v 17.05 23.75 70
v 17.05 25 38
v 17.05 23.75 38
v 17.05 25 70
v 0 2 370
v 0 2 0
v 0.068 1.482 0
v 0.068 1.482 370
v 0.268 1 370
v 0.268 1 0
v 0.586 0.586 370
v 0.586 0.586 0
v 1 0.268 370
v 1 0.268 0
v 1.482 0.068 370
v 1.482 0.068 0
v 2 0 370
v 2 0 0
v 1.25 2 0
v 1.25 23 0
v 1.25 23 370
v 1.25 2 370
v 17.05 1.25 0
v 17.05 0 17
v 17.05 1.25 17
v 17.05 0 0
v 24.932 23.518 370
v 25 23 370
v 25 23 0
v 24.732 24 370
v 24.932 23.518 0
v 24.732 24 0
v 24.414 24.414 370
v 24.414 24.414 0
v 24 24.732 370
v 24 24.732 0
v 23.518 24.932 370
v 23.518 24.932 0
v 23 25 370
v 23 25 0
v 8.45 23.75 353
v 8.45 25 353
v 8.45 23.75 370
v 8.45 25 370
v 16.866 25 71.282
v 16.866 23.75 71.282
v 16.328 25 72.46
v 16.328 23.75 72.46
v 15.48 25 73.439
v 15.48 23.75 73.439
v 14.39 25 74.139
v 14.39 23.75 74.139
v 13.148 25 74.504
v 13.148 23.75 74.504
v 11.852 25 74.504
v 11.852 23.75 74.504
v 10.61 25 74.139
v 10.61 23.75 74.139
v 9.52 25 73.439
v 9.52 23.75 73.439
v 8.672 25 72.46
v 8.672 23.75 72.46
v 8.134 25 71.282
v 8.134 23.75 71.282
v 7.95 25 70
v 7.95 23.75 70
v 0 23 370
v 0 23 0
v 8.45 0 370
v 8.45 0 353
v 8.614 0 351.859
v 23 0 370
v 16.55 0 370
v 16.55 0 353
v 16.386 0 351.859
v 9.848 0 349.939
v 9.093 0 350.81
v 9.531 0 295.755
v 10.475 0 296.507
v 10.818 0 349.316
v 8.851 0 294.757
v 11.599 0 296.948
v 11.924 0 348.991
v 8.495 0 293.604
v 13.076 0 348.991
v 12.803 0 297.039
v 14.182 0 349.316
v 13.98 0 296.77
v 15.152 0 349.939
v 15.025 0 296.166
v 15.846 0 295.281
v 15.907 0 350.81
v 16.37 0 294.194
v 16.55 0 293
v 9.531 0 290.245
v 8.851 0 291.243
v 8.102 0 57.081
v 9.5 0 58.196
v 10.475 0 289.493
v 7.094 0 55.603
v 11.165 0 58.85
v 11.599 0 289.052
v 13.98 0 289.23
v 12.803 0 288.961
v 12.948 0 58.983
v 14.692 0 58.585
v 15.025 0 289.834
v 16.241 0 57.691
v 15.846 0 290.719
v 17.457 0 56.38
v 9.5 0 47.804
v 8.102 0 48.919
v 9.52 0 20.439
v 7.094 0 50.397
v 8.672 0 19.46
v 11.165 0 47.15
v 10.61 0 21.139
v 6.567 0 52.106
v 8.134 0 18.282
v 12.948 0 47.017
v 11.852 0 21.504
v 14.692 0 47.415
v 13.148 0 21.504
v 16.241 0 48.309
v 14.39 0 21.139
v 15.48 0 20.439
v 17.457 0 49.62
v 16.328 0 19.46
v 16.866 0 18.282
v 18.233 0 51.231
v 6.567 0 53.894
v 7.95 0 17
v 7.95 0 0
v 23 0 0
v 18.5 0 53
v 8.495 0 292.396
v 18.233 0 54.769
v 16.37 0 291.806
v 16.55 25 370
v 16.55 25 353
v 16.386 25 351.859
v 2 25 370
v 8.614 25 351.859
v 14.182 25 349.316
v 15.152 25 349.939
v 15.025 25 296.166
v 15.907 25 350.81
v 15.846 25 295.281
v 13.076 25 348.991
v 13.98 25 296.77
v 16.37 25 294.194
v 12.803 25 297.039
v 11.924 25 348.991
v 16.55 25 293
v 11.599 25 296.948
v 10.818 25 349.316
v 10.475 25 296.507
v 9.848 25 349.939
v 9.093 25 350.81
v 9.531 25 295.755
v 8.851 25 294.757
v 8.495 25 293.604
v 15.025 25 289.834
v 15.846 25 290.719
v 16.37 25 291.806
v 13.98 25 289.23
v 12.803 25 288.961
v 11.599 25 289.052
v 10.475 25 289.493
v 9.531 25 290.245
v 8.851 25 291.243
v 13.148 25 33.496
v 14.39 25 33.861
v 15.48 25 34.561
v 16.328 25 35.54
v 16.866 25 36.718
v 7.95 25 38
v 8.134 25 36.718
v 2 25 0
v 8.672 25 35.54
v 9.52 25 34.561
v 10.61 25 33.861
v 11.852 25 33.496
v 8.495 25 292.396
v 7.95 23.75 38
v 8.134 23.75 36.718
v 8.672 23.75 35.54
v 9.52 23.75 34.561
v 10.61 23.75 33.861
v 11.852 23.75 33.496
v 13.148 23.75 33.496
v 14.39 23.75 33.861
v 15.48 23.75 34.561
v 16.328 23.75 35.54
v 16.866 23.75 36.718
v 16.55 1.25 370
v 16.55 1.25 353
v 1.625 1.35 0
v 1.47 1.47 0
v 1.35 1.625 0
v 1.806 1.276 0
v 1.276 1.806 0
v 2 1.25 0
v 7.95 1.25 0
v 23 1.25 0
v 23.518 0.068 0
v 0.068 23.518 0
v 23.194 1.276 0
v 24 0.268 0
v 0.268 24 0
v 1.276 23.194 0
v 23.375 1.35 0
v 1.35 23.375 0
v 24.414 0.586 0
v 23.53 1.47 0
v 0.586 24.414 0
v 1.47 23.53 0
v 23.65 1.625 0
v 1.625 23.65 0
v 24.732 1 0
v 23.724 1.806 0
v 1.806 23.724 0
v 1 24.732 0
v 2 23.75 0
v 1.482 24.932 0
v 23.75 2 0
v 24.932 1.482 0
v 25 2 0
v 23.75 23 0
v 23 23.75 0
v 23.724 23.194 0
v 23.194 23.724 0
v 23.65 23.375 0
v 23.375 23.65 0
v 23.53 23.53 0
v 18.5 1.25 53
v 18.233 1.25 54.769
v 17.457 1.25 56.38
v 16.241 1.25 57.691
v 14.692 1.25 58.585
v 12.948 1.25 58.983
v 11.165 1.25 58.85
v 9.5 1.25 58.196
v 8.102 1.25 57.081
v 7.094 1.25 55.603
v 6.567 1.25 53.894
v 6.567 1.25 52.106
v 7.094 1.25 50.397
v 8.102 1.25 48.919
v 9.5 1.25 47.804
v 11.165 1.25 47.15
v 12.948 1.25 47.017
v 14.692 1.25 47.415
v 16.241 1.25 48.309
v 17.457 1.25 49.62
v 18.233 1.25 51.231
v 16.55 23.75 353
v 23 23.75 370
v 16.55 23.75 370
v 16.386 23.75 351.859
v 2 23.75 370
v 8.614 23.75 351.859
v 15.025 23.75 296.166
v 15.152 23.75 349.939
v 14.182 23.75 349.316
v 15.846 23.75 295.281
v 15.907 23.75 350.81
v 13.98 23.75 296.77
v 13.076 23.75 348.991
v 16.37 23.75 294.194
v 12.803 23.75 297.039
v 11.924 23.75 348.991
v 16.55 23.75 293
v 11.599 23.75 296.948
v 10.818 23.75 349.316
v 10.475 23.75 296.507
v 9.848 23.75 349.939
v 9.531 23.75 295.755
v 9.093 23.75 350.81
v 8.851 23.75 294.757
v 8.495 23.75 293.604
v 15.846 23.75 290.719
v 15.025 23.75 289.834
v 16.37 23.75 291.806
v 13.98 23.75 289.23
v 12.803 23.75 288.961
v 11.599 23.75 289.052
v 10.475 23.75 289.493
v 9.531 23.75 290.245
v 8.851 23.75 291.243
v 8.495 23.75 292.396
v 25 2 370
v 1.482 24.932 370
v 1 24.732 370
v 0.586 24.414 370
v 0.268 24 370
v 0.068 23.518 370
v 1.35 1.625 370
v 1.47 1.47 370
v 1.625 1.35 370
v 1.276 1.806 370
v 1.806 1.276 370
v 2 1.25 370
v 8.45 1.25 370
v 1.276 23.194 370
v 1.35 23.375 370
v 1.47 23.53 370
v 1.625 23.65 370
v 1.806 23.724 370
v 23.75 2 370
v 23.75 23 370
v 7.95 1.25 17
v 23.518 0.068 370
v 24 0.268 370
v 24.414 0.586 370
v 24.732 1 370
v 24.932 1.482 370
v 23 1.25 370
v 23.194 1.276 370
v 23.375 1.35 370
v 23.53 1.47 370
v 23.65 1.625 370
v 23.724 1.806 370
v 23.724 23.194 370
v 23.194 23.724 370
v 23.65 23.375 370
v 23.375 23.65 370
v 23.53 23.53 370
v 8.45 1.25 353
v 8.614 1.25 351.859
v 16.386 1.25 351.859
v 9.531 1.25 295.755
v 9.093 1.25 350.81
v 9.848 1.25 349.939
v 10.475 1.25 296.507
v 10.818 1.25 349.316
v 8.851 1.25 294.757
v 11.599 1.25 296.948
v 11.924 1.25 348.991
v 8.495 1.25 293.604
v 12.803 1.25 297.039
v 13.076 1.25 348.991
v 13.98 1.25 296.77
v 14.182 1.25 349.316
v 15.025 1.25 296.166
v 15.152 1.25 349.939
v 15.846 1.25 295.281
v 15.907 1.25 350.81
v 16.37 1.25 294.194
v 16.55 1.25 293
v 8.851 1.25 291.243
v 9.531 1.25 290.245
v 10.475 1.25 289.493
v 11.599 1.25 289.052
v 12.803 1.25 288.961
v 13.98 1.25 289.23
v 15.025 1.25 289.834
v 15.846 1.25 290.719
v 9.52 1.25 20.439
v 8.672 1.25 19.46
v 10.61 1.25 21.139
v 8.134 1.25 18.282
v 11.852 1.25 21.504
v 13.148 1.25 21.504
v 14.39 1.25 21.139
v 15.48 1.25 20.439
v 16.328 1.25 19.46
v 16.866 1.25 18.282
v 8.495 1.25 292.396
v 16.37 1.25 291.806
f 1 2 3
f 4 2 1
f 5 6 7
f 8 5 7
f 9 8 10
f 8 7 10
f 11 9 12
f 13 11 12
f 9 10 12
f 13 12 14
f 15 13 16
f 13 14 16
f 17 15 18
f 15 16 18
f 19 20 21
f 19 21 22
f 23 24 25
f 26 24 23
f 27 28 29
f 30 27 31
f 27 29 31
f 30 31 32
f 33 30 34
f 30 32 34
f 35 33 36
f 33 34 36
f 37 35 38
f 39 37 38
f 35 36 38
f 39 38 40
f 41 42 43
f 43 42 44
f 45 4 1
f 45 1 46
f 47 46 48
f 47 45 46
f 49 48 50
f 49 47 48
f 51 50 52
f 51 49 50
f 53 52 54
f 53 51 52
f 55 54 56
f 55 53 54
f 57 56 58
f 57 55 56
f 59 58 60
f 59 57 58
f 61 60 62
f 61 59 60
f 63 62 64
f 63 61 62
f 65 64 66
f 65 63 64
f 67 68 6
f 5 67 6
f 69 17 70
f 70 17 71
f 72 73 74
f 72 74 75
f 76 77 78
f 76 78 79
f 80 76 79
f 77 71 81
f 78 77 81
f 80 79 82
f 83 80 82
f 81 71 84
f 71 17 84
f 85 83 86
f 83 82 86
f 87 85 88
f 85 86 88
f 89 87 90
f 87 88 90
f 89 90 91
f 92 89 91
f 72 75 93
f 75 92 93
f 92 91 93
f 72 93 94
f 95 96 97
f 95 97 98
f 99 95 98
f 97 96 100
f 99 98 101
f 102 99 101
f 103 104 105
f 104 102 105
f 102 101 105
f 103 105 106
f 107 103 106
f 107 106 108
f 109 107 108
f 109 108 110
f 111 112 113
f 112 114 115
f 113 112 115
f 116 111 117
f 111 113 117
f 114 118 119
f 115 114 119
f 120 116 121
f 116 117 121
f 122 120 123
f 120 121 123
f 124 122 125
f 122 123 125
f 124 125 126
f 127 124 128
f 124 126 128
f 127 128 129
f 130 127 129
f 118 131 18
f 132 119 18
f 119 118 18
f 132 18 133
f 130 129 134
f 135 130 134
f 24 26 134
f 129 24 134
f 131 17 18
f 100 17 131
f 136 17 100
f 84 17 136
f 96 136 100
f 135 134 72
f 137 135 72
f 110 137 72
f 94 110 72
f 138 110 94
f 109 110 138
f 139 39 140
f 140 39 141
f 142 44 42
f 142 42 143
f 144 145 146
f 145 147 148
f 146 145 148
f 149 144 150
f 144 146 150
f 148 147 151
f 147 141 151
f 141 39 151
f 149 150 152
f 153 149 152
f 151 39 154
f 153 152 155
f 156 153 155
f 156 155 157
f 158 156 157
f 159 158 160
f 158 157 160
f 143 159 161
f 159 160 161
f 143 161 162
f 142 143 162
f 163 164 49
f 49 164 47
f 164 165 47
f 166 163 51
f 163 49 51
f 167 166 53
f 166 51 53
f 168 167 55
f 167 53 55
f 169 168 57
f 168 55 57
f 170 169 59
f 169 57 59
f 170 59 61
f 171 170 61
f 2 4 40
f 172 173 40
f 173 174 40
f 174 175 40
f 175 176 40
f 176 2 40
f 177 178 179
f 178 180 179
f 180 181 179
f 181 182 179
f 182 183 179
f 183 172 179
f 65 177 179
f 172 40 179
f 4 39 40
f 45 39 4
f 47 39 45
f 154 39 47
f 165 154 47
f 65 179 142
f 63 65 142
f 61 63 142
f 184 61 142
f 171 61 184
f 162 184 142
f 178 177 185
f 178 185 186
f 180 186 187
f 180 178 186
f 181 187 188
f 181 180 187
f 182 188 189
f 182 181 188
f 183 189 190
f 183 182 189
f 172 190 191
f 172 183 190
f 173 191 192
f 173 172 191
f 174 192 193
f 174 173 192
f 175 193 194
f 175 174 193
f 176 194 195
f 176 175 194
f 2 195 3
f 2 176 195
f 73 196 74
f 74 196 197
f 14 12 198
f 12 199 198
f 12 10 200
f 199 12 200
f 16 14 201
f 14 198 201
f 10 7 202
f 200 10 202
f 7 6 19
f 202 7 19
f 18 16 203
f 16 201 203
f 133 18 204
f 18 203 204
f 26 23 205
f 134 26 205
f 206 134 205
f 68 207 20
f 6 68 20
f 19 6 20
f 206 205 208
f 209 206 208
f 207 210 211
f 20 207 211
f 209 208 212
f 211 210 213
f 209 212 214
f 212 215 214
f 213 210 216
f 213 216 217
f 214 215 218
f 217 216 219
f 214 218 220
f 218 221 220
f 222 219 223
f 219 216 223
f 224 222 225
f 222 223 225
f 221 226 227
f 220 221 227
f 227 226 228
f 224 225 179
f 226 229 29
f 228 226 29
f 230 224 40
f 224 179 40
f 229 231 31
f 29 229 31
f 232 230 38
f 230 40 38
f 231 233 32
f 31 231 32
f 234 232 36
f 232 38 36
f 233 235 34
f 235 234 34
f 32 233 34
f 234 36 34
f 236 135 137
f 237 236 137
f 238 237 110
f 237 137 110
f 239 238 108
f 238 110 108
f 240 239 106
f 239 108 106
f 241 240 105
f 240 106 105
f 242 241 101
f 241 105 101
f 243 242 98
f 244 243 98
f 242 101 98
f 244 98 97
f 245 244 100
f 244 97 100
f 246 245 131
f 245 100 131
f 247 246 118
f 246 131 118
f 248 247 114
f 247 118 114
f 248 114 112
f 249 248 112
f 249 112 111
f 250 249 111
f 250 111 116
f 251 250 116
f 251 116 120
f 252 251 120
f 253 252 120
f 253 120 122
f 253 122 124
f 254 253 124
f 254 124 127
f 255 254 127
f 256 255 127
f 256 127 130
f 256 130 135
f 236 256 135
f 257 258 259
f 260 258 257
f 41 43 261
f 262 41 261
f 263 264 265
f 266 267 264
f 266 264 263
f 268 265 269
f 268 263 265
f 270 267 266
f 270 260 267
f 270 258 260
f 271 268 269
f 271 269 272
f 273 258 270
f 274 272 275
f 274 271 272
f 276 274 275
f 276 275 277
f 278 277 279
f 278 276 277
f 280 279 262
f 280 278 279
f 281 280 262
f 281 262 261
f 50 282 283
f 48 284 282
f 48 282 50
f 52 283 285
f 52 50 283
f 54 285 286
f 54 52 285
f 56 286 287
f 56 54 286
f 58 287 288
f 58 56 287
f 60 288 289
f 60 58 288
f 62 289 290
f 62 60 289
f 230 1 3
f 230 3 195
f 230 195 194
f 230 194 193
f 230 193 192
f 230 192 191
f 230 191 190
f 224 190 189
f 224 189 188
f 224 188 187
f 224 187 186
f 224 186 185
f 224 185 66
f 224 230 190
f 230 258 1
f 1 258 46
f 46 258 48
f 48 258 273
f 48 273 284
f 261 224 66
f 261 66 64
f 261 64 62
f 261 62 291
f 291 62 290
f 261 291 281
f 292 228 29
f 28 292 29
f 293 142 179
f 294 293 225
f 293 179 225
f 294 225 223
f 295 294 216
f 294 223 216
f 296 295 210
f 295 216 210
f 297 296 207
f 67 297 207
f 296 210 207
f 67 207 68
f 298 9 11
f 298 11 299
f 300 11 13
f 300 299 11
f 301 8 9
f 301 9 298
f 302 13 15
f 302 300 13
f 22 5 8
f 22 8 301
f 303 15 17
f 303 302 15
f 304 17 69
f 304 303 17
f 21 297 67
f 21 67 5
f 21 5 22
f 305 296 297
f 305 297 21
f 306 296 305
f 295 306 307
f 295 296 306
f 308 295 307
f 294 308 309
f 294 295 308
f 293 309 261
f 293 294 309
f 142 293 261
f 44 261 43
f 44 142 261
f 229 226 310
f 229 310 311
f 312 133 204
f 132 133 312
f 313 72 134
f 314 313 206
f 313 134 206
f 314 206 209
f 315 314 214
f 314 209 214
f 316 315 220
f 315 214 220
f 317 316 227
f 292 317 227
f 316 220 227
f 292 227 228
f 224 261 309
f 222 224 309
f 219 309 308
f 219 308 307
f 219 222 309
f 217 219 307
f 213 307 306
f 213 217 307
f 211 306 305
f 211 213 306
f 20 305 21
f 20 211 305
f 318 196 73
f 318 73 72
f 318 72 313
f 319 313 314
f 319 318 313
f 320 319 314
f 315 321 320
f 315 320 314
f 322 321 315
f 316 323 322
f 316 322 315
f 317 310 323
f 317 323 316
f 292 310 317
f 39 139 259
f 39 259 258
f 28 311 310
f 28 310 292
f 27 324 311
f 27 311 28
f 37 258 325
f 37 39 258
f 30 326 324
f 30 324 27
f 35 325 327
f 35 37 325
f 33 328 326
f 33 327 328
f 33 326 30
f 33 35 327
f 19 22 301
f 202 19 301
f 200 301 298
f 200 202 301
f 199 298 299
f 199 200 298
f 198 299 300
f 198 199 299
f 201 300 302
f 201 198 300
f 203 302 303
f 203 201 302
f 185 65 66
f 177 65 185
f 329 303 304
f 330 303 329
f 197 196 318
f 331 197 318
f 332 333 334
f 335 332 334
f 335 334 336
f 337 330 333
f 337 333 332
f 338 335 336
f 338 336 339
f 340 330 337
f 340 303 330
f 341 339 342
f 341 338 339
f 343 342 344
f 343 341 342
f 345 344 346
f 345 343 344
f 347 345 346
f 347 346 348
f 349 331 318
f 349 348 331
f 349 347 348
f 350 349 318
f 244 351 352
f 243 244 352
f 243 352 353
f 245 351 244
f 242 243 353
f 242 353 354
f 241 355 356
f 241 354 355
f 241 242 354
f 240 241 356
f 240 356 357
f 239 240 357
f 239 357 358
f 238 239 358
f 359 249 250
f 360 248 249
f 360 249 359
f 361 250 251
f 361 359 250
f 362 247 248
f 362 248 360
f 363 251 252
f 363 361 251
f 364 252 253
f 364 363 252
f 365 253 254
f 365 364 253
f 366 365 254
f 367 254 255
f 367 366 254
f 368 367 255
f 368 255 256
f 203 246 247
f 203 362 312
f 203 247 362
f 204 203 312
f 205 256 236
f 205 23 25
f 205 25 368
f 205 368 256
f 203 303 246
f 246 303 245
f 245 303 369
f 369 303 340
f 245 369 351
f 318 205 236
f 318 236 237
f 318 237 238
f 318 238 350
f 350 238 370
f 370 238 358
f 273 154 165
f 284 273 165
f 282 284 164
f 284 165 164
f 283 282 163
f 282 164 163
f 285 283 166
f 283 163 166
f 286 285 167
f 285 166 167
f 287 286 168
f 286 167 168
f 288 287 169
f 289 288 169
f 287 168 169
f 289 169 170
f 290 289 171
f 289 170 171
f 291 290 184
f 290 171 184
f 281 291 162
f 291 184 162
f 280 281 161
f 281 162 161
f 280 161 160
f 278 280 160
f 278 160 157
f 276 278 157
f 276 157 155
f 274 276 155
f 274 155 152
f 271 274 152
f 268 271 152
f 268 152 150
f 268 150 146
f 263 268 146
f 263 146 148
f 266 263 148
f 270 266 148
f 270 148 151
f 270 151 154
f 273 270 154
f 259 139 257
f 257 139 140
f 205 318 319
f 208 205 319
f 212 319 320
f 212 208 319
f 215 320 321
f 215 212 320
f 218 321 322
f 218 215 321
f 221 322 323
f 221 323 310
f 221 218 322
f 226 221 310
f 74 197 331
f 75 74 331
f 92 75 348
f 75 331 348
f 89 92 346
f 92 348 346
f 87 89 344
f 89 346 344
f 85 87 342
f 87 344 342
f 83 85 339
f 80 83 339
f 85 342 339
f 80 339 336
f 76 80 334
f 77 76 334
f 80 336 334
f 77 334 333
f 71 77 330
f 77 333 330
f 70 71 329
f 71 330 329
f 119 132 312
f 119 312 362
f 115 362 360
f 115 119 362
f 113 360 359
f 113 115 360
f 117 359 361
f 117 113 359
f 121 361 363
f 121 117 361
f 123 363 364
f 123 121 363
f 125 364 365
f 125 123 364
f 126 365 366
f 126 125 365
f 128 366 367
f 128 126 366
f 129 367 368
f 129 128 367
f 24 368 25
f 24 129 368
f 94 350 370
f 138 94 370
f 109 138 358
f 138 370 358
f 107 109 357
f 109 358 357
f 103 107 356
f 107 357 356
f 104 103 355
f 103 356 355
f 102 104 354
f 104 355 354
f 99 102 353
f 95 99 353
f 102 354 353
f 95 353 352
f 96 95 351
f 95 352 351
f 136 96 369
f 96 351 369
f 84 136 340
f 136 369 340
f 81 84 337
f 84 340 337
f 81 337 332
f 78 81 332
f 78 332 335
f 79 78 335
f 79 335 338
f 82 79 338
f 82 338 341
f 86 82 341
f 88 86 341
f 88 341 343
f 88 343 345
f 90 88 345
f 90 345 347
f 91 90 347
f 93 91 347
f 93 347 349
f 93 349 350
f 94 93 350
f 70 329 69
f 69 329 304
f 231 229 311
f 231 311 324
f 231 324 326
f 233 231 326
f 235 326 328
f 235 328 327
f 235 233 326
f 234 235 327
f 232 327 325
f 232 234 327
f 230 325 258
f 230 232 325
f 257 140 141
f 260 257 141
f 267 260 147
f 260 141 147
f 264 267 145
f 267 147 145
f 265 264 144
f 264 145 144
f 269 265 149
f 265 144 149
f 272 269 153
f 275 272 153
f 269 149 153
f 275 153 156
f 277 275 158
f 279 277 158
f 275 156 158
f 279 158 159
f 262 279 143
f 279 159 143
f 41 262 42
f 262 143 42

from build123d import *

# Parameters (mm, degrees)
BOSS_EXTRUDE1_DEPTH = 370
SKETCH2_R           = 4.05
CUT_EXTRUDE1_DEPTH  = 26
CUT_EXTRUDE2_REACH  = 27
CUT_EXTRUDE3_REACH  = 27
SKETCH4_R           = 6


with BuildPart() as part:
    # Sketch1 → Boss-Extrude1 (new body)
    with BuildSketch(Plane.XY):
        with BuildLine():
            Line((2, 0), (23, 0))
            ThreePointArc((23, 0), (24.414213562, 0.585786438), (25, 2))
            Line((25, 2), (25, 23))
            ThreePointArc((25, 23), (24.414213562, 24.414213562), (23, 25))
            Line((23, 25), (2, 25))
            ThreePointArc((2, 25), (0.585786438, 24.414213562), (0, 23))
            Line((0, 23), (0, 2))
            ThreePointArc((0, 2), (0.585786438, 0.585786438), (2, 0))
        make_face()
        with BuildLine():
            Line((2, 1.25), (23, 1.25))
            ThreePointArc((23, 1.25), (23.530330086, 1.469669914), (23.75, 2))
            Line((23.75, 2), (23.75, 23))
            ThreePointArc((23.75, 23), (23.530330086, 23.530330086), (23, 23.75))
            Line((23, 23.75), (2, 23.75))
            ThreePointArc((2, 23.75), (1.469669914, 23.530330086), (1.25, 23))
            Line((1.25, 23), (1.25, 2))
            ThreePointArc((1.25, 2), (1.469669914, 1.469669914), (2, 1.25))
        make_face(mode=Mode.SUBTRACT)
    extrude(amount=BOSS_EXTRUDE1_DEPTH)

    # Sketch2 → Cut-Extrude1 (cut, through all)
    with BuildSketch(Plane(origin=(0, 25, 0), x_dir=(1, 0, 0), z_dir=(0, 1, 0))):
        with Locations((12.5, -293)):
            Circle(SKETCH2_R)
        with BuildLine():
            Line((8.45, -353), (8.45, -370))
            Line((8.45, -370), (16.55, -370))
            Line((16.55, -370), (16.55, -353))
            ThreePointArc((16.55, -353), (12.5, -348.95), (8.45, -353))
        make_face()
    extrude(amount=-CUT_EXTRUDE1_DEPTH, mode=Mode.SUBTRACT)

    # Sketch3 → Cut-Extrude2 (cut, up to next)
    with BuildSketch(Plane(origin=(0, 25, 0), x_dir=(1, 0, 0), z_dir=(0, 1, 0)), mode=Mode.PRIVATE) as cut_extrude2_sk1:
        with BuildLine():
            Line((17.05, -38), (17.05, -70))
            ThreePointArc((17.05, -70), (12.5, -74.55), (7.95, -70))
            Line((7.95, -70), (7.95, -38))
            ThreePointArc((7.95, -38), (12.5, -33.45), (17.05, -38))
        make_face()
    cut_extrude2_tool1 = extrude(cut_extrude2_sk1.sketch, amount=-CUT_EXTRUDE2_REACH, mode=Mode.PRIVATE) & part.part
    add(cut_extrude2_tool1.solids().sort_by_distance((12.5, 25, 54))[0], mode=Mode.SUBTRACT)

    # Sketch4 → Cut-Extrude3 (cut, up to next)
    with BuildSketch(Plane.XZ, mode=Mode.PRIVATE) as cut_extrude3_sk1:
        with Locations((12.5, 53)):
            Circle(SKETCH4_R)
    cut_extrude3_tool1 = extrude(cut_extrude3_sk1.sketch, amount=-CUT_EXTRUDE3_REACH, mode=Mode.PRIVATE) & part.part
    add(cut_extrude3_tool1.solids().sort_by_distance((12.5, 0, 53))[0], mode=Mode.SUBTRACT)
    # Sketch4 → Cut-Extrude3 (cut, up to next)
    with BuildSketch(Plane.XZ, mode=Mode.PRIVATE) as cut_extrude3_sk2:
        with BuildLine():
            Line((7.95, 0), (7.95, 17))
            ThreePointArc((7.95, 17), (12.5, 21.55), (17.05, 17))
            Line((17.05, 17), (17.05, 0))
            Line((17.05, 0), (7.95, 0))
        make_face()
    cut_extrude3_tool2 = extrude(cut_extrude3_sk2.sketch, amount=-CUT_EXTRUDE3_REACH, mode=Mode.PRIVATE) & part.part
    add(cut_extrude3_tool2.solids().sort_by_distance((12.5, 0, 10.311845))[0], mode=Mode.SUBTRACT)


solid = part.part
